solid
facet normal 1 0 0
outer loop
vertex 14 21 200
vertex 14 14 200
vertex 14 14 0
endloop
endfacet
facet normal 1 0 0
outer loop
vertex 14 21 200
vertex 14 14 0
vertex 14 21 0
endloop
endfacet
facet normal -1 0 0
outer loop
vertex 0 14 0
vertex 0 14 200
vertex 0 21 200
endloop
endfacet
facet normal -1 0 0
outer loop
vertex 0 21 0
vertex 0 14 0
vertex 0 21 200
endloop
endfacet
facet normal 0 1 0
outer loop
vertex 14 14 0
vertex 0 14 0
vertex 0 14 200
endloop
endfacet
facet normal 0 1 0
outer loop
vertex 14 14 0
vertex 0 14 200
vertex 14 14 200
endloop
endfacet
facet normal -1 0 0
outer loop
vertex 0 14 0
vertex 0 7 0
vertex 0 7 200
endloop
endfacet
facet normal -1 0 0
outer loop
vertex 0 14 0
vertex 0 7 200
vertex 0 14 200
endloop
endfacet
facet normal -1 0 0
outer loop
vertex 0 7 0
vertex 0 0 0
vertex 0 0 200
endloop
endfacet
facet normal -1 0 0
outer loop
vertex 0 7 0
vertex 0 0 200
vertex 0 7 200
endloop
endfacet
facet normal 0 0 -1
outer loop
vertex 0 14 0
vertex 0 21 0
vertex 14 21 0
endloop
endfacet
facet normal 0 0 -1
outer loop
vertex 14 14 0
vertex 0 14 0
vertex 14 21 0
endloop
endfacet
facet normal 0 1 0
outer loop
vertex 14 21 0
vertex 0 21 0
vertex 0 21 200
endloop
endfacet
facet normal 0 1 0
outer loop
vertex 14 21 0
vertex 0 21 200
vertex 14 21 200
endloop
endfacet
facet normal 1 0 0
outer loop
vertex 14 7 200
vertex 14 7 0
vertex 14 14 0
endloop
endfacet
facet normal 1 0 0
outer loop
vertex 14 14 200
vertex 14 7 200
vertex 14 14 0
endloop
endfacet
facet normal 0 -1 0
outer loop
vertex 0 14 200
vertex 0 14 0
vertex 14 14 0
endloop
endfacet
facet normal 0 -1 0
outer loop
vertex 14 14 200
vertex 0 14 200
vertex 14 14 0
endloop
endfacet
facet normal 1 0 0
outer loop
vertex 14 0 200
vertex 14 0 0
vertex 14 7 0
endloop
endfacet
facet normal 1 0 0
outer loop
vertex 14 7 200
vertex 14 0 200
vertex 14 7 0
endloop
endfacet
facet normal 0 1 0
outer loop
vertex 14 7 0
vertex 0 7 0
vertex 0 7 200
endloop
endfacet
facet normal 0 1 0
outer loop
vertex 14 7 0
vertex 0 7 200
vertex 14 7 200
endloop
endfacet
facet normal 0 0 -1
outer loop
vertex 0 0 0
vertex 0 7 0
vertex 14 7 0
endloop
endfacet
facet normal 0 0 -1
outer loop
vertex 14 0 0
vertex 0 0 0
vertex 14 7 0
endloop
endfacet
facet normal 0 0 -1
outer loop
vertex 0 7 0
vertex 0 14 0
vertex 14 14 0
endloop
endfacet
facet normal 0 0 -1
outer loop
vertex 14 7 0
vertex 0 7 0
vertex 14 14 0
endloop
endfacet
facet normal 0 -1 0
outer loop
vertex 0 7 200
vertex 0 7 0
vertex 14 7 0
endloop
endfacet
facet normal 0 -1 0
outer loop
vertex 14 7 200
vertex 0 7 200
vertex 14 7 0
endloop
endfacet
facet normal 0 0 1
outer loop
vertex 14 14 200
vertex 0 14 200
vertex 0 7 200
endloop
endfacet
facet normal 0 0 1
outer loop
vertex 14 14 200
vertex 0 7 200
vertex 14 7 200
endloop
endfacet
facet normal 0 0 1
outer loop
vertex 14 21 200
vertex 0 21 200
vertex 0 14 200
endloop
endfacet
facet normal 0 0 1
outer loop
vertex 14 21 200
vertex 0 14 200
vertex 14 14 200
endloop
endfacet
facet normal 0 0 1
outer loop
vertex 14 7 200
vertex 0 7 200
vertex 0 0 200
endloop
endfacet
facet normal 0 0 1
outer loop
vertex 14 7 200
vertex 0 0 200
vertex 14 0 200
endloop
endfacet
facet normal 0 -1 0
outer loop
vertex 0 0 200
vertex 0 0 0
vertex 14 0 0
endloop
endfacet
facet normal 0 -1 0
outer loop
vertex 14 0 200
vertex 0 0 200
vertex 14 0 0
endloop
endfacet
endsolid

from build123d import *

# Parameters (mm, degrees)
SZKIC1_W                    = 14
SZKIC1_H                    = 21
DODANIE_WYCI_GNI_CIE2_DEPTH = 200
PODZIEL1_SURFACE_1_1_BACK   = 202.586
PODZIEL1_SURFACE_1_1_DEPTH  = 405.172
PODZIEL1_SURFACE_1_2_BACK   = 202.586
PODZIEL1_SURFACE_1_2_DEPTH  = 405.172
PODZIEL1_SURFACE_3_3_BACK   = 202.586
PODZIEL1_SURFACE_3_3_DEPTH  = 405.172
PODZIEL1_SURFACE_3_4_BACK   = 202.586
PODZIEL1_SURFACE_3_4_DEPTH  = 405.172


with BuildPart() as part:
    # Szkic1 → Dodanie-wyciągnięcie2 (new body)
    with BuildSketch(Plane.XY):
        with Locations((7, 10.5)):
            Rectangle(SZKIC1_W, SZKIC1_H)
    extrude(amount=DODANIE_WYCI_GNI_CIE2_DEPTH)


with BuildPart() as body_2:
    # Podziel1: the piece behind the surface
    add(part.part)
    # Podziel1 surface 1: a surface, the sketch's curves swept straight by 405.172 mm
    with BuildLine(Plane.XY.offset(-PODZIEL1_SURFACE_1_1_BACK), mode=Mode.PRIVATE) as podziel1_surface_1_1_path:
        Line((0, 14), (14, 14))
    podziel1_surface_1_1 = Shell.extrude(podziel1_surface_1_1_path.wire(), (0 * PODZIEL1_SURFACE_1_1_DEPTH, 0 * PODZIEL1_SURFACE_1_1_DEPTH, 1 * PODZIEL1_SURFACE_1_1_DEPTH))
    split(bisect_by=podziel1_surface_1_1, keep=Keep.BOTTOM)


with BuildPart() as part_1:
    add(part.part)

    # Podziel1: split by a surface, the side it looks to stays
    # Podziel1 surface 1: a surface, the sketch's curves swept straight by 405.172 mm
    with BuildLine(Plane.XY.offset(-PODZIEL1_SURFACE_1_2_BACK), mode=Mode.PRIVATE) as podziel1_surface_1_2_path:
        Line((0, 14), (14, 14))
    podziel1_surface_1_2 = Shell.extrude(podziel1_surface_1_2_path.wire(), (0 * PODZIEL1_SURFACE_1_2_DEPTH, 0 * PODZIEL1_SURFACE_1_2_DEPTH, 1 * PODZIEL1_SURFACE_1_2_DEPTH))
    split(bisect_by=podziel1_surface_1_2, keep=Keep.TOP)


with BuildPart() as body_3_2:
    # Podziel1 3 body 2: the piece behind the surface
    add(body_2.part)
    # Podziel1 surface 3: a surface, the sketch's curves swept straight by 405.172 mm
    with BuildLine(Plane.XY.offset(-PODZIEL1_SURFACE_3_3_BACK), mode=Mode.PRIVATE) as podziel1_surface_3_3_path:
        Line((0, 7), (14, 7))
    podziel1_surface_3_3 = Shell.extrude(podziel1_surface_3_3_path.wire(), (0 * PODZIEL1_SURFACE_3_3_DEPTH, 0 * PODZIEL1_SURFACE_3_3_DEPTH, 1 * PODZIEL1_SURFACE_3_3_DEPTH))
    split(bisect_by=podziel1_surface_3_3, keep=Keep.BOTTOM)


with BuildPart() as body_2_1:
    add(body_2.part)

    # Podziel1 3 body 2: split by a surface, the side it looks to stays
    # Podziel1 surface 3: a surface, the sketch's curves swept straight by 405.172 mm
    with BuildLine(Plane.XY.offset(-PODZIEL1_SURFACE_3_4_BACK), mode=Mode.PRIVATE) as podziel1_surface_3_4_path:
        Line((0, 7), (14, 7))
    podziel1_surface_3_4 = Shell.extrude(podziel1_surface_3_4_path.wire(), (0 * PODZIEL1_SURFACE_3_4_DEPTH, 0 * PODZIEL1_SURFACE_3_4_DEPTH, 1 * PODZIEL1_SURFACE_3_4_DEPTH))
    split(bisect_by=podziel1_surface_3_4, keep=Keep.TOP)


solid = Compound([part_1.part, body_3_2.part, body_2_1.part])
